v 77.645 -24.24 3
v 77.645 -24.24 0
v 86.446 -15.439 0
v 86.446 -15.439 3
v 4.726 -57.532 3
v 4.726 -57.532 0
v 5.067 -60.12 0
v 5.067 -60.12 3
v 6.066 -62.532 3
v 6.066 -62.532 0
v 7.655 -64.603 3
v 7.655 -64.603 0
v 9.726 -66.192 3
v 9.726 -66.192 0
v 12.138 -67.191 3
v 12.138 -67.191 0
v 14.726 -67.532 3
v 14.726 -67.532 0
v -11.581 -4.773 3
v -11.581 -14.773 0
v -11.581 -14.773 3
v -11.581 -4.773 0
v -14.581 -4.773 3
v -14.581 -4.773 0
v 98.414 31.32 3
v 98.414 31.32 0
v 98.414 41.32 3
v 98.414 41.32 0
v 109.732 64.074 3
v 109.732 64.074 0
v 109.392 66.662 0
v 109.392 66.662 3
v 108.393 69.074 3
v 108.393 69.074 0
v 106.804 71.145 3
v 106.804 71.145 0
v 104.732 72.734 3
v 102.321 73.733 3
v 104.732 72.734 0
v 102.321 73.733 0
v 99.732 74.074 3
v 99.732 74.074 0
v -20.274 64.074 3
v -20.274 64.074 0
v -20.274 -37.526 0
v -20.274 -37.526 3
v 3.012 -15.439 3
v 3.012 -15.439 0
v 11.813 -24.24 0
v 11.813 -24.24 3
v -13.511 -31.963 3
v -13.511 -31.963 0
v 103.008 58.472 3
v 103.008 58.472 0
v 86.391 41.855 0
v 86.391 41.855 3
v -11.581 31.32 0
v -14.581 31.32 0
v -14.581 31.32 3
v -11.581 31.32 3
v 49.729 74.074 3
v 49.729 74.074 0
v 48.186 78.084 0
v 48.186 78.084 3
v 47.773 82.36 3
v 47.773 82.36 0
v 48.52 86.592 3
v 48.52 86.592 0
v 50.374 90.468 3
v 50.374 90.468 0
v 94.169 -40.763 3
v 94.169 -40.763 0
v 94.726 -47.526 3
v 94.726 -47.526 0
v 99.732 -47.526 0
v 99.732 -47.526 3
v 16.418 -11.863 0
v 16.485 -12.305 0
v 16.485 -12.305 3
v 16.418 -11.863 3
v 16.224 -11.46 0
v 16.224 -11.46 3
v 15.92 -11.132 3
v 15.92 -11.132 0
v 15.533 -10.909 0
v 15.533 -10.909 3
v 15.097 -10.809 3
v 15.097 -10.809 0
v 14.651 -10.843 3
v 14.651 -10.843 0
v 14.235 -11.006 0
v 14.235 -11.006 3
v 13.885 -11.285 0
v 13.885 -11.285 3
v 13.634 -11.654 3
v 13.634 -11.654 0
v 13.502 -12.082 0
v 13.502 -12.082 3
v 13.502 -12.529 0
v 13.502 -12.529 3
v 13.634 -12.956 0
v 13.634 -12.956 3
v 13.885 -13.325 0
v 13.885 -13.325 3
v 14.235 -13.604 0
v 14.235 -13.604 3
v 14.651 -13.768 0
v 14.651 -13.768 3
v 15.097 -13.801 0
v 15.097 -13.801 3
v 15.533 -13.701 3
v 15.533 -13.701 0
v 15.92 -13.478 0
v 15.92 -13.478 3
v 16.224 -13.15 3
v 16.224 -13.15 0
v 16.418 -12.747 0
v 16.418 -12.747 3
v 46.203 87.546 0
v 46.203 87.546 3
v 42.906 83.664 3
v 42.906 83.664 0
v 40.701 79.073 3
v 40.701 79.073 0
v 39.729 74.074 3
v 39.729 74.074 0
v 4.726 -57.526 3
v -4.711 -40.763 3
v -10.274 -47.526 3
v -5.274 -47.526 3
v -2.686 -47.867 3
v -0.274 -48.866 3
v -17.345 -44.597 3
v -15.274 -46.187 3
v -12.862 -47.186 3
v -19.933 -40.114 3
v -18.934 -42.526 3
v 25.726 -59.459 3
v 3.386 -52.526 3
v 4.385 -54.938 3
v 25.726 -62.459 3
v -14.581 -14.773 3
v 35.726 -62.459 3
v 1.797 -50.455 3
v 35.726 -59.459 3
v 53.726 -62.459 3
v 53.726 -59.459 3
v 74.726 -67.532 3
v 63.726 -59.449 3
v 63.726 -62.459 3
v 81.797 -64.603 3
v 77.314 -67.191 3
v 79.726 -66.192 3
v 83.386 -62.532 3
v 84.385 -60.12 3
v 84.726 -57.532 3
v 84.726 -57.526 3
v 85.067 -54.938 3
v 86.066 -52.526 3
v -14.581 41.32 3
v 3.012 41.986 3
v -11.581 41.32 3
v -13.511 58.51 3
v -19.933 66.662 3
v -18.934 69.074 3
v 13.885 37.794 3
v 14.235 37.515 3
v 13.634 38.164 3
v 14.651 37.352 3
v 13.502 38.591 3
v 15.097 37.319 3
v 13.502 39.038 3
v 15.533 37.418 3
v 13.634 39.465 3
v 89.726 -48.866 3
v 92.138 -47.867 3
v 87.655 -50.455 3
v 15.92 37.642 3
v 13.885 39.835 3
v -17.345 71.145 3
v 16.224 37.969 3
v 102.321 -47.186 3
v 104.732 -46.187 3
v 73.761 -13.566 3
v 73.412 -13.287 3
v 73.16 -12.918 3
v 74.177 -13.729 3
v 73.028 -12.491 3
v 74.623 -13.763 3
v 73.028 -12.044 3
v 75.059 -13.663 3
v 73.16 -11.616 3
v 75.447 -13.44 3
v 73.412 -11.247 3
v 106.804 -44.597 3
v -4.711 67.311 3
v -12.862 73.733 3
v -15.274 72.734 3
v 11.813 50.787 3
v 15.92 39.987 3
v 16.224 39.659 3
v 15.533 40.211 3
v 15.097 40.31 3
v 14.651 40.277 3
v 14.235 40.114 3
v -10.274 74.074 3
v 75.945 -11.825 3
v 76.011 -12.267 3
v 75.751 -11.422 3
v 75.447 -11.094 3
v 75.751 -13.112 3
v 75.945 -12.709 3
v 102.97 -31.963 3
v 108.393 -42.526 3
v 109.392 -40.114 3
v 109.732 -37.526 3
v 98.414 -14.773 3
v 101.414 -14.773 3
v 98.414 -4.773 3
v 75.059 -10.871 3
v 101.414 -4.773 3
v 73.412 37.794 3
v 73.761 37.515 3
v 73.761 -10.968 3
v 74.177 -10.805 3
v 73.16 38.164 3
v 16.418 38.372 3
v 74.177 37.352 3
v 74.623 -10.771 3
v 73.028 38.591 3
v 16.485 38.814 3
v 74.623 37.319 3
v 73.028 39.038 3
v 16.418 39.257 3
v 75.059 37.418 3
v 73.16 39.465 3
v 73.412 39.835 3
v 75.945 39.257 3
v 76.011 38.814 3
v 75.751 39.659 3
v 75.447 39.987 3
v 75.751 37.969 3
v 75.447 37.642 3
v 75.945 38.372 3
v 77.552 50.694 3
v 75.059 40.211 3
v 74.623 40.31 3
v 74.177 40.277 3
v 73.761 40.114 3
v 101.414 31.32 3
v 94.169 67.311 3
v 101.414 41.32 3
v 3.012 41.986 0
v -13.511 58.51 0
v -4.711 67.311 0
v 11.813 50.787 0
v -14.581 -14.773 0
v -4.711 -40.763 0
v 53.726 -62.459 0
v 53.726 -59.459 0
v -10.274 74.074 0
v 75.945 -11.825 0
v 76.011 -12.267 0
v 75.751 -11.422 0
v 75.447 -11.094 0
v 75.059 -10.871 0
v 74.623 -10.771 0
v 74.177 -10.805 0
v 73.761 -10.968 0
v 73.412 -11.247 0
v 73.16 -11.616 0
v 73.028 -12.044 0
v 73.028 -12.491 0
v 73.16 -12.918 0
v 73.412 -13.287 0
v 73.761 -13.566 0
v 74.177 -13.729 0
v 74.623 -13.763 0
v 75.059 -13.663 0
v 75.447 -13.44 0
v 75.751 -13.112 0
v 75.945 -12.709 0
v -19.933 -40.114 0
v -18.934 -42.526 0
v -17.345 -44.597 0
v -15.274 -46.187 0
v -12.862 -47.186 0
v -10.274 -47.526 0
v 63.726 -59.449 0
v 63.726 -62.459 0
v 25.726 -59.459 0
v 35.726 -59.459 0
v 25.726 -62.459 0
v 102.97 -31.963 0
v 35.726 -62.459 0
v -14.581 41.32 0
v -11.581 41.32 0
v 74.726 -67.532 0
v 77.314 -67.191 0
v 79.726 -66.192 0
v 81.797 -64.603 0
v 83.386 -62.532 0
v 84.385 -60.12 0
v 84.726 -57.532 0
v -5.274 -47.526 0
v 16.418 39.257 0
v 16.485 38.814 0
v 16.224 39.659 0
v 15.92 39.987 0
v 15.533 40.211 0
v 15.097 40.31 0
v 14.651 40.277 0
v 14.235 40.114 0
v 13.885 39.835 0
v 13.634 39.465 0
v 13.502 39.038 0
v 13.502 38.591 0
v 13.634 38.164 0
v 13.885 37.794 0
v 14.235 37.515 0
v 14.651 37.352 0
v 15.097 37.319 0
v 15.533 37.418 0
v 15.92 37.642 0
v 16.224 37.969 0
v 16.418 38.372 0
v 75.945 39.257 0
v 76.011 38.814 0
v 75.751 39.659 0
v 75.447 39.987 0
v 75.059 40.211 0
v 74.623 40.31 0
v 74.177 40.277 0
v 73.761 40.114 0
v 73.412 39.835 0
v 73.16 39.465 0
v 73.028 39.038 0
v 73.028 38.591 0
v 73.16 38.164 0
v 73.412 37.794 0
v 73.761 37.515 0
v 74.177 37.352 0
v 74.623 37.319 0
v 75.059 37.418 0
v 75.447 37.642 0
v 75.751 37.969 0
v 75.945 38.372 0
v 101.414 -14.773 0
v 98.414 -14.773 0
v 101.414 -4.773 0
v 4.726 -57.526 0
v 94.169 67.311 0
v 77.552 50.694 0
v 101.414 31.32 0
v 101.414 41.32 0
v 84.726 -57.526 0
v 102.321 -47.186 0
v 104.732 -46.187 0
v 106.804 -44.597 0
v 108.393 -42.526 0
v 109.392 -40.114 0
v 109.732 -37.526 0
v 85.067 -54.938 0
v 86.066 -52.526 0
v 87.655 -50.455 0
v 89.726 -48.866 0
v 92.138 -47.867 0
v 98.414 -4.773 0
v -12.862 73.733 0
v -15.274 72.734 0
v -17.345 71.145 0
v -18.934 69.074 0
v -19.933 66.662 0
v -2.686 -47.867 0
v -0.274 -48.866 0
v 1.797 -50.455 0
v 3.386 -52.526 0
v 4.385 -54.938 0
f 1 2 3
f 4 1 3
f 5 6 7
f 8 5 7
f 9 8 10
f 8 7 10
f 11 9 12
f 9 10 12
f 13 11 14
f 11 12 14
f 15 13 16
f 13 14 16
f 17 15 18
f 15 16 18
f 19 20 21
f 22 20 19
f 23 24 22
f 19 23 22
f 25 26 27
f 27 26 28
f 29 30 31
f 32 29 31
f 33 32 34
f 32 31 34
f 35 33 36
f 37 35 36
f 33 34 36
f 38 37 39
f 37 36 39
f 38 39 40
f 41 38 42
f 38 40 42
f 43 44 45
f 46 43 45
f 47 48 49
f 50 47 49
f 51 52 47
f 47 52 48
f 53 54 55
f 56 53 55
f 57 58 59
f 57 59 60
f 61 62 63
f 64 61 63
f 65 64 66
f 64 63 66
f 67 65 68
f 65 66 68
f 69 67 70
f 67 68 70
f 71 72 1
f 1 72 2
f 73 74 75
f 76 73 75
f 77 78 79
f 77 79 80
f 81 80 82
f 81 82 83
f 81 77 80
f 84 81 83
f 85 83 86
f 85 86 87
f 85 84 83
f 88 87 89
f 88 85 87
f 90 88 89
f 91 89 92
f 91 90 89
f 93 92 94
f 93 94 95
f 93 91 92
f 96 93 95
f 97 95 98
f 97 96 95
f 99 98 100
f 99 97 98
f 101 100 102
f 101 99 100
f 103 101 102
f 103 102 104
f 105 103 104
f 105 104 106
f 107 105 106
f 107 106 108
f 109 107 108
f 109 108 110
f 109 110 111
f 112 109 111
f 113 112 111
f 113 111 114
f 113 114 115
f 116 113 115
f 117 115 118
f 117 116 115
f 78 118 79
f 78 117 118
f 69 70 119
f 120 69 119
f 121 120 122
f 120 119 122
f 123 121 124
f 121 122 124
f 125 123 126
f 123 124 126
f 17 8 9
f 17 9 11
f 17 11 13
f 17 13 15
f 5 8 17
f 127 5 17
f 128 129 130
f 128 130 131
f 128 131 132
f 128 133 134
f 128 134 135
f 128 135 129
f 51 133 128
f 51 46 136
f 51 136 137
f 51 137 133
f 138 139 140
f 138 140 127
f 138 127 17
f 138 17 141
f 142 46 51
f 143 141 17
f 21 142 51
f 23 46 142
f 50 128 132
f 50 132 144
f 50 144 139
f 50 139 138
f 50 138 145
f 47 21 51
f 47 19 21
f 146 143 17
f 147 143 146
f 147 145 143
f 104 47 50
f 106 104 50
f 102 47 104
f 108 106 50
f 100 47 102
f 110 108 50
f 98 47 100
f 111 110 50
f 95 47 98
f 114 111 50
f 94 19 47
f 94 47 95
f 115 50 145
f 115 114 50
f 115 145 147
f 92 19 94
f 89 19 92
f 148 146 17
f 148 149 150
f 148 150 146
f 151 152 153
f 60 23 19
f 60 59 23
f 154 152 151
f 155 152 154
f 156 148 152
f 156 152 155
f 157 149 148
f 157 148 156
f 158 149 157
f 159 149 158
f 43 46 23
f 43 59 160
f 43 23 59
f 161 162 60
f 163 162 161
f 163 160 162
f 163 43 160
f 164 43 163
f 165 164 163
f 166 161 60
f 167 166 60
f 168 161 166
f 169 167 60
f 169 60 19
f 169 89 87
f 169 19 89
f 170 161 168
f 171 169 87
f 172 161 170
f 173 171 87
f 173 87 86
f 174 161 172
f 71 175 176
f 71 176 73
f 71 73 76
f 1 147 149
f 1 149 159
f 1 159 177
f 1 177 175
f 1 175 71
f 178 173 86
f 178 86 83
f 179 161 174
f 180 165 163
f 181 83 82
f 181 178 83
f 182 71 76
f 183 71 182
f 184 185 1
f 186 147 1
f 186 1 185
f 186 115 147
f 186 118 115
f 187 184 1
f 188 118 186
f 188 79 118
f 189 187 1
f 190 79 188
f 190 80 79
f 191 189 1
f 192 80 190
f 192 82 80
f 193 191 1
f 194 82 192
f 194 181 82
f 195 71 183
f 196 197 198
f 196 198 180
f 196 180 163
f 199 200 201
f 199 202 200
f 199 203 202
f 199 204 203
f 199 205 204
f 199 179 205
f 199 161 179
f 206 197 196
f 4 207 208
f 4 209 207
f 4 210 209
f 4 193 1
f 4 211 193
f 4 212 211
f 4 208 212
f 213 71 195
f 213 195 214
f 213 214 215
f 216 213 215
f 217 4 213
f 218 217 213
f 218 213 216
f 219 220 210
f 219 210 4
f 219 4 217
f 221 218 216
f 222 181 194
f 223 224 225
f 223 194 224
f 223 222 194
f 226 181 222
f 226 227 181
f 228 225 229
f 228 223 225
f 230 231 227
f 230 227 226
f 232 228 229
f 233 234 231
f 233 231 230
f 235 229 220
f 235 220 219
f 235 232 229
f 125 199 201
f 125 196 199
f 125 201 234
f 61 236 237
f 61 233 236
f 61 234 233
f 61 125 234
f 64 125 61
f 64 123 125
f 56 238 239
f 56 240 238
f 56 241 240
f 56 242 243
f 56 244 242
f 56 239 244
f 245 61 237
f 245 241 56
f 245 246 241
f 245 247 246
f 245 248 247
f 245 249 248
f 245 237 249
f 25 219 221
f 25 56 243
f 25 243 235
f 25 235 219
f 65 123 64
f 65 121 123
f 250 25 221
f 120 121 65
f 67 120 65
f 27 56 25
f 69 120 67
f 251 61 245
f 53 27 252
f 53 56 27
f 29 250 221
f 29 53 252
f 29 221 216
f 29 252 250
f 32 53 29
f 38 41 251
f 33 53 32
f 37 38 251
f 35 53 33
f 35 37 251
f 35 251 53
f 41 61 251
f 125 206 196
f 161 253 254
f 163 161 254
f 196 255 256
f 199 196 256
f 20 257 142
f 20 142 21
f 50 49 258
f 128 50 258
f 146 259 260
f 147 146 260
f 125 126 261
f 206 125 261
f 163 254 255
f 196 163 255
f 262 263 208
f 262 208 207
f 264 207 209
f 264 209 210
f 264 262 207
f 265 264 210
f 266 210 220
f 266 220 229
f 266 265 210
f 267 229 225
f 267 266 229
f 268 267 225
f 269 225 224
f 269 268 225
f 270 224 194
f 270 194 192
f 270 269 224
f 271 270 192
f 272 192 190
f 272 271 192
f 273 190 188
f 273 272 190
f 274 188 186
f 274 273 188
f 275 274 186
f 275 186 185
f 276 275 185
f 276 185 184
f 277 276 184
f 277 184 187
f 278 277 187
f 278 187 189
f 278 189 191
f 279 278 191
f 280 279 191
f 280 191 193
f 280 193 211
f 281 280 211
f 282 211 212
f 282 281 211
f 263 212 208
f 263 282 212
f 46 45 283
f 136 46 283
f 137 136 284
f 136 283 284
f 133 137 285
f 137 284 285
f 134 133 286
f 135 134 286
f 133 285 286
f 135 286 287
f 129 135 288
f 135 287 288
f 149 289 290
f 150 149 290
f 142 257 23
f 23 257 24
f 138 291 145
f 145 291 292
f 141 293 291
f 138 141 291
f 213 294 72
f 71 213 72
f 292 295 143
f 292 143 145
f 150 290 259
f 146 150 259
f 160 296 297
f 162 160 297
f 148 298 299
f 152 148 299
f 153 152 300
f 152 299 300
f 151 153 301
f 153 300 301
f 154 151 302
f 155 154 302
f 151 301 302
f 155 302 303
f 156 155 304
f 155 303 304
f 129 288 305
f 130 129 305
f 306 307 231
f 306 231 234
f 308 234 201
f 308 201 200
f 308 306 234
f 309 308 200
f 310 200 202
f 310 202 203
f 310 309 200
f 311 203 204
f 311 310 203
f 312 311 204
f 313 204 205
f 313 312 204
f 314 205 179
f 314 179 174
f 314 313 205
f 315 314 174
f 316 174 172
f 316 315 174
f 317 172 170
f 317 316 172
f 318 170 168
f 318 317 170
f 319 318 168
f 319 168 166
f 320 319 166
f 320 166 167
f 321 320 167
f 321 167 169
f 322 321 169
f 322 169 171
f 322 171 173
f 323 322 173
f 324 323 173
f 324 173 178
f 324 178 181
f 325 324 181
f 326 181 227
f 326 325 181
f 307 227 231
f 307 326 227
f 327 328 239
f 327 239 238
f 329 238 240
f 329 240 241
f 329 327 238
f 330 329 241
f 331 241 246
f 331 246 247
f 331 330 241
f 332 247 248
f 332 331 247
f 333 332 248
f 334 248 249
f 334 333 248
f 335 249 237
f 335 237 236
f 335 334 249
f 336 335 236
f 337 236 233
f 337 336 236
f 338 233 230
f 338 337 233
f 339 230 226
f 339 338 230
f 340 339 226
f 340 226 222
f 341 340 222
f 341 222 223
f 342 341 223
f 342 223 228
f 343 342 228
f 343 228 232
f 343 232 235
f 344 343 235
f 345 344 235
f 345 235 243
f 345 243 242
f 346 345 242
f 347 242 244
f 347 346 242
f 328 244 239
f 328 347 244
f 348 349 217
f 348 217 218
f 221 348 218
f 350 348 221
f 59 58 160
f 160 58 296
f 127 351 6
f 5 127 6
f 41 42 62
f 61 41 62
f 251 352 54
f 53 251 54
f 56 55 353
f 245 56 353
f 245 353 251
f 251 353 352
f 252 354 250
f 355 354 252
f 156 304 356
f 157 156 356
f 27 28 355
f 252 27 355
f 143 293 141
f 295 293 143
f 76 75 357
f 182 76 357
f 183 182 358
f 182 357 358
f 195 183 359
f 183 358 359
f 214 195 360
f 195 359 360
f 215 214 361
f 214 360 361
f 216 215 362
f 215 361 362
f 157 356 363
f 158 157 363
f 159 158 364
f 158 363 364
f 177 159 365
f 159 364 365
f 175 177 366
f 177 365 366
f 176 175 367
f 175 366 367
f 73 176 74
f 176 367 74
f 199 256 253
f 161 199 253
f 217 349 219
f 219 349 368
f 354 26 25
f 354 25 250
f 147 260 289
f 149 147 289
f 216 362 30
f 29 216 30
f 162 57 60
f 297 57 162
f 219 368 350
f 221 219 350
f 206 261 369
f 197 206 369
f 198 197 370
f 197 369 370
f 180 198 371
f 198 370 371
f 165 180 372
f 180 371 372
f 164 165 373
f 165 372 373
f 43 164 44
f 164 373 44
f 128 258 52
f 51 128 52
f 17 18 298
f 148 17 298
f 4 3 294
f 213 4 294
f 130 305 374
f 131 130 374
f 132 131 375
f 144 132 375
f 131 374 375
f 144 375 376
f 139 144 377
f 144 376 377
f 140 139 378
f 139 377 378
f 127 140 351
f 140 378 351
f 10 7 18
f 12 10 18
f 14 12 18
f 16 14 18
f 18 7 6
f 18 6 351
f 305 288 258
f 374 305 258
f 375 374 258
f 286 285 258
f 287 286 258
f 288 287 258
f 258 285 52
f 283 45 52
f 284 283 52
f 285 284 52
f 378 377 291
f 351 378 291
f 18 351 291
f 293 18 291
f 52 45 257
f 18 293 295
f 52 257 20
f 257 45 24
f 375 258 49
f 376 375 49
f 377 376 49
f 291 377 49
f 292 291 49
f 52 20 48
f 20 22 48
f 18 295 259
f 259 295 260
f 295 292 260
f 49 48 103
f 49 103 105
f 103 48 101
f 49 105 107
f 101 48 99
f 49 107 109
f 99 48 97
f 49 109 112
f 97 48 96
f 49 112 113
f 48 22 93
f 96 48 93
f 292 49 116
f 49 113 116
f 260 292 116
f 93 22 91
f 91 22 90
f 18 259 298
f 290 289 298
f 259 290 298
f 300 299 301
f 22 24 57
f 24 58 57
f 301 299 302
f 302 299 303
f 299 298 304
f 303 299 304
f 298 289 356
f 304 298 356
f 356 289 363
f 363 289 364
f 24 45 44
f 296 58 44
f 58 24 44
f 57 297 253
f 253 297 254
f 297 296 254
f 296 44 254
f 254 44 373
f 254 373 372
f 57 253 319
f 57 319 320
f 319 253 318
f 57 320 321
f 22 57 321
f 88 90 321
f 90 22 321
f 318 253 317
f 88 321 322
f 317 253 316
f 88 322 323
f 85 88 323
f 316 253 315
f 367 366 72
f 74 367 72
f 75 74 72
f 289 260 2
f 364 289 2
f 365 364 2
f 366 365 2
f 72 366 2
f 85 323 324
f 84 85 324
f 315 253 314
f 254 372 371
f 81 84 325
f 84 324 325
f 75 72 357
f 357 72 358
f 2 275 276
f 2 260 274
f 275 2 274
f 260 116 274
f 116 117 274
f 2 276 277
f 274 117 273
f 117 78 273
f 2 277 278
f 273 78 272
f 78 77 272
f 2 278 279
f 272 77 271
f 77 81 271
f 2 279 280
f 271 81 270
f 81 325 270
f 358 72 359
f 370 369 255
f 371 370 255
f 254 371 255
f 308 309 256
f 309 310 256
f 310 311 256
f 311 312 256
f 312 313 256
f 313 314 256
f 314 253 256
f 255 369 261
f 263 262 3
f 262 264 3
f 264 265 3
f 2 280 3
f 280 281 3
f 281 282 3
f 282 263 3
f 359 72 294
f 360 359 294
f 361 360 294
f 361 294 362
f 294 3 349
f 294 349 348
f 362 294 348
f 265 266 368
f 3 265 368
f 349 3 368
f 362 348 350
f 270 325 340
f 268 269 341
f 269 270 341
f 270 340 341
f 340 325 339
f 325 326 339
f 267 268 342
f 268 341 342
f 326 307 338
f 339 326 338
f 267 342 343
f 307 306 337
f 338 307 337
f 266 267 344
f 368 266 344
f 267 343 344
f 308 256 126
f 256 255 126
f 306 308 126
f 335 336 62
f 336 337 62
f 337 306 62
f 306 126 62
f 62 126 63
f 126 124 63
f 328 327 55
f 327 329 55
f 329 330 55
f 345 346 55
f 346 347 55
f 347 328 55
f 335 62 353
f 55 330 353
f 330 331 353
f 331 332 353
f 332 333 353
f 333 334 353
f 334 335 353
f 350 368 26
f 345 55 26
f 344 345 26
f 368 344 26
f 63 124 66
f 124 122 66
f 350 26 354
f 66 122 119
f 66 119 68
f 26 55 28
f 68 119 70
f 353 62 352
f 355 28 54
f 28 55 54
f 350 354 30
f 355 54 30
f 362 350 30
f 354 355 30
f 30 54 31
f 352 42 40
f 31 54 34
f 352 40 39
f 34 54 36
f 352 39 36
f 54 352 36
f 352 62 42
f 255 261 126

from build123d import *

# Parameters (mm, degrees)
MODEL_W                 = 10
MODEL_H                 = 3
MODEL_W_2               = 3
MODEL_H_2               = 10
MODEL_R                 = 1.5
SALIENTE_EXTRUIR1_DEPTH = 3


with BuildPart() as part:
    # Model → Saliente-Extruir1 (new body)
    with BuildSketch(Plane.XY):
        with BuildLine():
            Line((-10.274239299, -47.526259687), (-5.274229553, -47.526259687))
            ThreePointArc((-5.274229553, -47.526259687), (1.796838258, -50.455191875), (4.725770447, -57.526259687))
            Line((4.725770447, -57.526259687), (4.725770447, -57.532159687))
            ThreePointArc((4.725770447, -57.532159687), (7.654702635, -64.603227499), (14.725770447, -67.532159687))
            Line((14.725770447, -67.532159687), (74.725770447, -67.532159687))
            ThreePointArc((74.725770447, -67.532159687), (81.796838258, -64.603227499), (84.725770447, -57.532159687))
            Line((84.725770447, -57.532159687), (84.725770447, -57.526259687))
            ThreePointArc((84.725770447, -57.526259687), (87.654702635, -50.455191875), (94.725770447, -47.526259687))
            Line((94.725770447, -47.526259687), (99.732474793, -47.526259687))
            ThreePointArc((99.732474793, -47.526259687), (106.803542605, -44.597327499), (109.732474793, -37.526259687))
            Line((109.732474793, -37.526259687), (109.732474793, 64.073740313))
            ThreePointArc((109.732474793, 64.073740313), (106.803542605, 71.144808125), (99.732474793, 74.073740313))
            Line((99.732474793, 74.073740313), (49.729117747, 74.073740313))
            ThreePointArc((49.729117747, 74.073740313), (47.772685887, 82.360468062), (50.374223429, 90.467840313))
            ThreePointArc((50.374223429, 90.467840313), (42.906482031, 83.66371575), (39.729117747, 74.073740313))
            Line((39.729117747, 74.073740313), (-10.274239299, 74.073740313))
            ThreePointArc((-10.274239299, 74.073740313), (-17.345307111, 71.144808125), (-20.274239299, 64.073740313))
            Line((-20.274239299, 64.073740313), (-20.274239299, -37.526259687))
            ThreePointArc((-20.274239299, -37.526259687), (-17.345307111, -44.597327499), (-10.274239299, -47.526259687))
        make_face()
        Polygon((-4.710690354, -40.763410741), (-13.511389214, -31.962709682), (3.012309414, -15.439007345), (11.813010679, -24.239709709), align=None, mode=Mode.SUBTRACT)
        with Locations((30.725760701, -60.959219621)):
            Rectangle(MODEL_W, MODEL_H, mode=Mode.SUBTRACT)
        with Locations((-13.08093725, -9.772535148)):
            Rectangle(MODEL_W_2, MODEL_H_2, mode=Mode.SUBTRACT)
        with Locations((14.984988274, -12.305130612)):
            Circle(MODEL_R, mode=Mode.SUBTRACT)
        Polygon((63.725774778, -62.459219621), (53.725780192, -62.459219621), (53.725780192, -59.459219621), (63.725774778, -59.448813721), align=None, mode=Mode.SUBTRACT)
        Polygon((102.969574793, -31.962759687), (94.16892376, -40.763410719), (77.645224816, -24.239709664), (86.445874793, -15.439059687), align=None, mode=Mode.SUBTRACT)
        with Locations((74.511280689, -12.267097017)):
            Circle(MODEL_R, mode=Mode.SUBTRACT)
        with Locations((99.91359519, -9.772535148)):
            Rectangle(MODEL_W_2, MODEL_H_2, mode=Mode.SUBTRACT)
        with Locations((-13.08093725, 36.320015775)):
            Rectangle(MODEL_W_2, MODEL_H_2, mode=Mode.SUBTRACT)
        with Locations((14.984988274, 38.81446274)):
            Circle(MODEL_R, mode=Mode.SUBTRACT)
        Polygon((-4.710739299, 67.310840313), (11.812961756, 50.787139259), (3.012310656, 41.986490358), (-13.511389299, 58.510190313), align=None, mode=Mode.SUBTRACT)
        with Locations((74.511280689, 38.81446274)):
            Circle(MODEL_R, mode=Mode.SUBTRACT)
        with Locations((99.91359519, 36.320015775)):
            Rectangle(MODEL_W_2, MODEL_H_2, mode=Mode.SUBTRACT)
        Polygon((103.007708555, 58.472006804), (86.39069839, 41.854996145), (77.551864592, 50.693831877), (94.168873658, 67.310841438), align=None, mode=Mode.SUBTRACT)
    extrude(amount=SALIENTE_EXTRUIR1_DEPTH)


solid = part.part
